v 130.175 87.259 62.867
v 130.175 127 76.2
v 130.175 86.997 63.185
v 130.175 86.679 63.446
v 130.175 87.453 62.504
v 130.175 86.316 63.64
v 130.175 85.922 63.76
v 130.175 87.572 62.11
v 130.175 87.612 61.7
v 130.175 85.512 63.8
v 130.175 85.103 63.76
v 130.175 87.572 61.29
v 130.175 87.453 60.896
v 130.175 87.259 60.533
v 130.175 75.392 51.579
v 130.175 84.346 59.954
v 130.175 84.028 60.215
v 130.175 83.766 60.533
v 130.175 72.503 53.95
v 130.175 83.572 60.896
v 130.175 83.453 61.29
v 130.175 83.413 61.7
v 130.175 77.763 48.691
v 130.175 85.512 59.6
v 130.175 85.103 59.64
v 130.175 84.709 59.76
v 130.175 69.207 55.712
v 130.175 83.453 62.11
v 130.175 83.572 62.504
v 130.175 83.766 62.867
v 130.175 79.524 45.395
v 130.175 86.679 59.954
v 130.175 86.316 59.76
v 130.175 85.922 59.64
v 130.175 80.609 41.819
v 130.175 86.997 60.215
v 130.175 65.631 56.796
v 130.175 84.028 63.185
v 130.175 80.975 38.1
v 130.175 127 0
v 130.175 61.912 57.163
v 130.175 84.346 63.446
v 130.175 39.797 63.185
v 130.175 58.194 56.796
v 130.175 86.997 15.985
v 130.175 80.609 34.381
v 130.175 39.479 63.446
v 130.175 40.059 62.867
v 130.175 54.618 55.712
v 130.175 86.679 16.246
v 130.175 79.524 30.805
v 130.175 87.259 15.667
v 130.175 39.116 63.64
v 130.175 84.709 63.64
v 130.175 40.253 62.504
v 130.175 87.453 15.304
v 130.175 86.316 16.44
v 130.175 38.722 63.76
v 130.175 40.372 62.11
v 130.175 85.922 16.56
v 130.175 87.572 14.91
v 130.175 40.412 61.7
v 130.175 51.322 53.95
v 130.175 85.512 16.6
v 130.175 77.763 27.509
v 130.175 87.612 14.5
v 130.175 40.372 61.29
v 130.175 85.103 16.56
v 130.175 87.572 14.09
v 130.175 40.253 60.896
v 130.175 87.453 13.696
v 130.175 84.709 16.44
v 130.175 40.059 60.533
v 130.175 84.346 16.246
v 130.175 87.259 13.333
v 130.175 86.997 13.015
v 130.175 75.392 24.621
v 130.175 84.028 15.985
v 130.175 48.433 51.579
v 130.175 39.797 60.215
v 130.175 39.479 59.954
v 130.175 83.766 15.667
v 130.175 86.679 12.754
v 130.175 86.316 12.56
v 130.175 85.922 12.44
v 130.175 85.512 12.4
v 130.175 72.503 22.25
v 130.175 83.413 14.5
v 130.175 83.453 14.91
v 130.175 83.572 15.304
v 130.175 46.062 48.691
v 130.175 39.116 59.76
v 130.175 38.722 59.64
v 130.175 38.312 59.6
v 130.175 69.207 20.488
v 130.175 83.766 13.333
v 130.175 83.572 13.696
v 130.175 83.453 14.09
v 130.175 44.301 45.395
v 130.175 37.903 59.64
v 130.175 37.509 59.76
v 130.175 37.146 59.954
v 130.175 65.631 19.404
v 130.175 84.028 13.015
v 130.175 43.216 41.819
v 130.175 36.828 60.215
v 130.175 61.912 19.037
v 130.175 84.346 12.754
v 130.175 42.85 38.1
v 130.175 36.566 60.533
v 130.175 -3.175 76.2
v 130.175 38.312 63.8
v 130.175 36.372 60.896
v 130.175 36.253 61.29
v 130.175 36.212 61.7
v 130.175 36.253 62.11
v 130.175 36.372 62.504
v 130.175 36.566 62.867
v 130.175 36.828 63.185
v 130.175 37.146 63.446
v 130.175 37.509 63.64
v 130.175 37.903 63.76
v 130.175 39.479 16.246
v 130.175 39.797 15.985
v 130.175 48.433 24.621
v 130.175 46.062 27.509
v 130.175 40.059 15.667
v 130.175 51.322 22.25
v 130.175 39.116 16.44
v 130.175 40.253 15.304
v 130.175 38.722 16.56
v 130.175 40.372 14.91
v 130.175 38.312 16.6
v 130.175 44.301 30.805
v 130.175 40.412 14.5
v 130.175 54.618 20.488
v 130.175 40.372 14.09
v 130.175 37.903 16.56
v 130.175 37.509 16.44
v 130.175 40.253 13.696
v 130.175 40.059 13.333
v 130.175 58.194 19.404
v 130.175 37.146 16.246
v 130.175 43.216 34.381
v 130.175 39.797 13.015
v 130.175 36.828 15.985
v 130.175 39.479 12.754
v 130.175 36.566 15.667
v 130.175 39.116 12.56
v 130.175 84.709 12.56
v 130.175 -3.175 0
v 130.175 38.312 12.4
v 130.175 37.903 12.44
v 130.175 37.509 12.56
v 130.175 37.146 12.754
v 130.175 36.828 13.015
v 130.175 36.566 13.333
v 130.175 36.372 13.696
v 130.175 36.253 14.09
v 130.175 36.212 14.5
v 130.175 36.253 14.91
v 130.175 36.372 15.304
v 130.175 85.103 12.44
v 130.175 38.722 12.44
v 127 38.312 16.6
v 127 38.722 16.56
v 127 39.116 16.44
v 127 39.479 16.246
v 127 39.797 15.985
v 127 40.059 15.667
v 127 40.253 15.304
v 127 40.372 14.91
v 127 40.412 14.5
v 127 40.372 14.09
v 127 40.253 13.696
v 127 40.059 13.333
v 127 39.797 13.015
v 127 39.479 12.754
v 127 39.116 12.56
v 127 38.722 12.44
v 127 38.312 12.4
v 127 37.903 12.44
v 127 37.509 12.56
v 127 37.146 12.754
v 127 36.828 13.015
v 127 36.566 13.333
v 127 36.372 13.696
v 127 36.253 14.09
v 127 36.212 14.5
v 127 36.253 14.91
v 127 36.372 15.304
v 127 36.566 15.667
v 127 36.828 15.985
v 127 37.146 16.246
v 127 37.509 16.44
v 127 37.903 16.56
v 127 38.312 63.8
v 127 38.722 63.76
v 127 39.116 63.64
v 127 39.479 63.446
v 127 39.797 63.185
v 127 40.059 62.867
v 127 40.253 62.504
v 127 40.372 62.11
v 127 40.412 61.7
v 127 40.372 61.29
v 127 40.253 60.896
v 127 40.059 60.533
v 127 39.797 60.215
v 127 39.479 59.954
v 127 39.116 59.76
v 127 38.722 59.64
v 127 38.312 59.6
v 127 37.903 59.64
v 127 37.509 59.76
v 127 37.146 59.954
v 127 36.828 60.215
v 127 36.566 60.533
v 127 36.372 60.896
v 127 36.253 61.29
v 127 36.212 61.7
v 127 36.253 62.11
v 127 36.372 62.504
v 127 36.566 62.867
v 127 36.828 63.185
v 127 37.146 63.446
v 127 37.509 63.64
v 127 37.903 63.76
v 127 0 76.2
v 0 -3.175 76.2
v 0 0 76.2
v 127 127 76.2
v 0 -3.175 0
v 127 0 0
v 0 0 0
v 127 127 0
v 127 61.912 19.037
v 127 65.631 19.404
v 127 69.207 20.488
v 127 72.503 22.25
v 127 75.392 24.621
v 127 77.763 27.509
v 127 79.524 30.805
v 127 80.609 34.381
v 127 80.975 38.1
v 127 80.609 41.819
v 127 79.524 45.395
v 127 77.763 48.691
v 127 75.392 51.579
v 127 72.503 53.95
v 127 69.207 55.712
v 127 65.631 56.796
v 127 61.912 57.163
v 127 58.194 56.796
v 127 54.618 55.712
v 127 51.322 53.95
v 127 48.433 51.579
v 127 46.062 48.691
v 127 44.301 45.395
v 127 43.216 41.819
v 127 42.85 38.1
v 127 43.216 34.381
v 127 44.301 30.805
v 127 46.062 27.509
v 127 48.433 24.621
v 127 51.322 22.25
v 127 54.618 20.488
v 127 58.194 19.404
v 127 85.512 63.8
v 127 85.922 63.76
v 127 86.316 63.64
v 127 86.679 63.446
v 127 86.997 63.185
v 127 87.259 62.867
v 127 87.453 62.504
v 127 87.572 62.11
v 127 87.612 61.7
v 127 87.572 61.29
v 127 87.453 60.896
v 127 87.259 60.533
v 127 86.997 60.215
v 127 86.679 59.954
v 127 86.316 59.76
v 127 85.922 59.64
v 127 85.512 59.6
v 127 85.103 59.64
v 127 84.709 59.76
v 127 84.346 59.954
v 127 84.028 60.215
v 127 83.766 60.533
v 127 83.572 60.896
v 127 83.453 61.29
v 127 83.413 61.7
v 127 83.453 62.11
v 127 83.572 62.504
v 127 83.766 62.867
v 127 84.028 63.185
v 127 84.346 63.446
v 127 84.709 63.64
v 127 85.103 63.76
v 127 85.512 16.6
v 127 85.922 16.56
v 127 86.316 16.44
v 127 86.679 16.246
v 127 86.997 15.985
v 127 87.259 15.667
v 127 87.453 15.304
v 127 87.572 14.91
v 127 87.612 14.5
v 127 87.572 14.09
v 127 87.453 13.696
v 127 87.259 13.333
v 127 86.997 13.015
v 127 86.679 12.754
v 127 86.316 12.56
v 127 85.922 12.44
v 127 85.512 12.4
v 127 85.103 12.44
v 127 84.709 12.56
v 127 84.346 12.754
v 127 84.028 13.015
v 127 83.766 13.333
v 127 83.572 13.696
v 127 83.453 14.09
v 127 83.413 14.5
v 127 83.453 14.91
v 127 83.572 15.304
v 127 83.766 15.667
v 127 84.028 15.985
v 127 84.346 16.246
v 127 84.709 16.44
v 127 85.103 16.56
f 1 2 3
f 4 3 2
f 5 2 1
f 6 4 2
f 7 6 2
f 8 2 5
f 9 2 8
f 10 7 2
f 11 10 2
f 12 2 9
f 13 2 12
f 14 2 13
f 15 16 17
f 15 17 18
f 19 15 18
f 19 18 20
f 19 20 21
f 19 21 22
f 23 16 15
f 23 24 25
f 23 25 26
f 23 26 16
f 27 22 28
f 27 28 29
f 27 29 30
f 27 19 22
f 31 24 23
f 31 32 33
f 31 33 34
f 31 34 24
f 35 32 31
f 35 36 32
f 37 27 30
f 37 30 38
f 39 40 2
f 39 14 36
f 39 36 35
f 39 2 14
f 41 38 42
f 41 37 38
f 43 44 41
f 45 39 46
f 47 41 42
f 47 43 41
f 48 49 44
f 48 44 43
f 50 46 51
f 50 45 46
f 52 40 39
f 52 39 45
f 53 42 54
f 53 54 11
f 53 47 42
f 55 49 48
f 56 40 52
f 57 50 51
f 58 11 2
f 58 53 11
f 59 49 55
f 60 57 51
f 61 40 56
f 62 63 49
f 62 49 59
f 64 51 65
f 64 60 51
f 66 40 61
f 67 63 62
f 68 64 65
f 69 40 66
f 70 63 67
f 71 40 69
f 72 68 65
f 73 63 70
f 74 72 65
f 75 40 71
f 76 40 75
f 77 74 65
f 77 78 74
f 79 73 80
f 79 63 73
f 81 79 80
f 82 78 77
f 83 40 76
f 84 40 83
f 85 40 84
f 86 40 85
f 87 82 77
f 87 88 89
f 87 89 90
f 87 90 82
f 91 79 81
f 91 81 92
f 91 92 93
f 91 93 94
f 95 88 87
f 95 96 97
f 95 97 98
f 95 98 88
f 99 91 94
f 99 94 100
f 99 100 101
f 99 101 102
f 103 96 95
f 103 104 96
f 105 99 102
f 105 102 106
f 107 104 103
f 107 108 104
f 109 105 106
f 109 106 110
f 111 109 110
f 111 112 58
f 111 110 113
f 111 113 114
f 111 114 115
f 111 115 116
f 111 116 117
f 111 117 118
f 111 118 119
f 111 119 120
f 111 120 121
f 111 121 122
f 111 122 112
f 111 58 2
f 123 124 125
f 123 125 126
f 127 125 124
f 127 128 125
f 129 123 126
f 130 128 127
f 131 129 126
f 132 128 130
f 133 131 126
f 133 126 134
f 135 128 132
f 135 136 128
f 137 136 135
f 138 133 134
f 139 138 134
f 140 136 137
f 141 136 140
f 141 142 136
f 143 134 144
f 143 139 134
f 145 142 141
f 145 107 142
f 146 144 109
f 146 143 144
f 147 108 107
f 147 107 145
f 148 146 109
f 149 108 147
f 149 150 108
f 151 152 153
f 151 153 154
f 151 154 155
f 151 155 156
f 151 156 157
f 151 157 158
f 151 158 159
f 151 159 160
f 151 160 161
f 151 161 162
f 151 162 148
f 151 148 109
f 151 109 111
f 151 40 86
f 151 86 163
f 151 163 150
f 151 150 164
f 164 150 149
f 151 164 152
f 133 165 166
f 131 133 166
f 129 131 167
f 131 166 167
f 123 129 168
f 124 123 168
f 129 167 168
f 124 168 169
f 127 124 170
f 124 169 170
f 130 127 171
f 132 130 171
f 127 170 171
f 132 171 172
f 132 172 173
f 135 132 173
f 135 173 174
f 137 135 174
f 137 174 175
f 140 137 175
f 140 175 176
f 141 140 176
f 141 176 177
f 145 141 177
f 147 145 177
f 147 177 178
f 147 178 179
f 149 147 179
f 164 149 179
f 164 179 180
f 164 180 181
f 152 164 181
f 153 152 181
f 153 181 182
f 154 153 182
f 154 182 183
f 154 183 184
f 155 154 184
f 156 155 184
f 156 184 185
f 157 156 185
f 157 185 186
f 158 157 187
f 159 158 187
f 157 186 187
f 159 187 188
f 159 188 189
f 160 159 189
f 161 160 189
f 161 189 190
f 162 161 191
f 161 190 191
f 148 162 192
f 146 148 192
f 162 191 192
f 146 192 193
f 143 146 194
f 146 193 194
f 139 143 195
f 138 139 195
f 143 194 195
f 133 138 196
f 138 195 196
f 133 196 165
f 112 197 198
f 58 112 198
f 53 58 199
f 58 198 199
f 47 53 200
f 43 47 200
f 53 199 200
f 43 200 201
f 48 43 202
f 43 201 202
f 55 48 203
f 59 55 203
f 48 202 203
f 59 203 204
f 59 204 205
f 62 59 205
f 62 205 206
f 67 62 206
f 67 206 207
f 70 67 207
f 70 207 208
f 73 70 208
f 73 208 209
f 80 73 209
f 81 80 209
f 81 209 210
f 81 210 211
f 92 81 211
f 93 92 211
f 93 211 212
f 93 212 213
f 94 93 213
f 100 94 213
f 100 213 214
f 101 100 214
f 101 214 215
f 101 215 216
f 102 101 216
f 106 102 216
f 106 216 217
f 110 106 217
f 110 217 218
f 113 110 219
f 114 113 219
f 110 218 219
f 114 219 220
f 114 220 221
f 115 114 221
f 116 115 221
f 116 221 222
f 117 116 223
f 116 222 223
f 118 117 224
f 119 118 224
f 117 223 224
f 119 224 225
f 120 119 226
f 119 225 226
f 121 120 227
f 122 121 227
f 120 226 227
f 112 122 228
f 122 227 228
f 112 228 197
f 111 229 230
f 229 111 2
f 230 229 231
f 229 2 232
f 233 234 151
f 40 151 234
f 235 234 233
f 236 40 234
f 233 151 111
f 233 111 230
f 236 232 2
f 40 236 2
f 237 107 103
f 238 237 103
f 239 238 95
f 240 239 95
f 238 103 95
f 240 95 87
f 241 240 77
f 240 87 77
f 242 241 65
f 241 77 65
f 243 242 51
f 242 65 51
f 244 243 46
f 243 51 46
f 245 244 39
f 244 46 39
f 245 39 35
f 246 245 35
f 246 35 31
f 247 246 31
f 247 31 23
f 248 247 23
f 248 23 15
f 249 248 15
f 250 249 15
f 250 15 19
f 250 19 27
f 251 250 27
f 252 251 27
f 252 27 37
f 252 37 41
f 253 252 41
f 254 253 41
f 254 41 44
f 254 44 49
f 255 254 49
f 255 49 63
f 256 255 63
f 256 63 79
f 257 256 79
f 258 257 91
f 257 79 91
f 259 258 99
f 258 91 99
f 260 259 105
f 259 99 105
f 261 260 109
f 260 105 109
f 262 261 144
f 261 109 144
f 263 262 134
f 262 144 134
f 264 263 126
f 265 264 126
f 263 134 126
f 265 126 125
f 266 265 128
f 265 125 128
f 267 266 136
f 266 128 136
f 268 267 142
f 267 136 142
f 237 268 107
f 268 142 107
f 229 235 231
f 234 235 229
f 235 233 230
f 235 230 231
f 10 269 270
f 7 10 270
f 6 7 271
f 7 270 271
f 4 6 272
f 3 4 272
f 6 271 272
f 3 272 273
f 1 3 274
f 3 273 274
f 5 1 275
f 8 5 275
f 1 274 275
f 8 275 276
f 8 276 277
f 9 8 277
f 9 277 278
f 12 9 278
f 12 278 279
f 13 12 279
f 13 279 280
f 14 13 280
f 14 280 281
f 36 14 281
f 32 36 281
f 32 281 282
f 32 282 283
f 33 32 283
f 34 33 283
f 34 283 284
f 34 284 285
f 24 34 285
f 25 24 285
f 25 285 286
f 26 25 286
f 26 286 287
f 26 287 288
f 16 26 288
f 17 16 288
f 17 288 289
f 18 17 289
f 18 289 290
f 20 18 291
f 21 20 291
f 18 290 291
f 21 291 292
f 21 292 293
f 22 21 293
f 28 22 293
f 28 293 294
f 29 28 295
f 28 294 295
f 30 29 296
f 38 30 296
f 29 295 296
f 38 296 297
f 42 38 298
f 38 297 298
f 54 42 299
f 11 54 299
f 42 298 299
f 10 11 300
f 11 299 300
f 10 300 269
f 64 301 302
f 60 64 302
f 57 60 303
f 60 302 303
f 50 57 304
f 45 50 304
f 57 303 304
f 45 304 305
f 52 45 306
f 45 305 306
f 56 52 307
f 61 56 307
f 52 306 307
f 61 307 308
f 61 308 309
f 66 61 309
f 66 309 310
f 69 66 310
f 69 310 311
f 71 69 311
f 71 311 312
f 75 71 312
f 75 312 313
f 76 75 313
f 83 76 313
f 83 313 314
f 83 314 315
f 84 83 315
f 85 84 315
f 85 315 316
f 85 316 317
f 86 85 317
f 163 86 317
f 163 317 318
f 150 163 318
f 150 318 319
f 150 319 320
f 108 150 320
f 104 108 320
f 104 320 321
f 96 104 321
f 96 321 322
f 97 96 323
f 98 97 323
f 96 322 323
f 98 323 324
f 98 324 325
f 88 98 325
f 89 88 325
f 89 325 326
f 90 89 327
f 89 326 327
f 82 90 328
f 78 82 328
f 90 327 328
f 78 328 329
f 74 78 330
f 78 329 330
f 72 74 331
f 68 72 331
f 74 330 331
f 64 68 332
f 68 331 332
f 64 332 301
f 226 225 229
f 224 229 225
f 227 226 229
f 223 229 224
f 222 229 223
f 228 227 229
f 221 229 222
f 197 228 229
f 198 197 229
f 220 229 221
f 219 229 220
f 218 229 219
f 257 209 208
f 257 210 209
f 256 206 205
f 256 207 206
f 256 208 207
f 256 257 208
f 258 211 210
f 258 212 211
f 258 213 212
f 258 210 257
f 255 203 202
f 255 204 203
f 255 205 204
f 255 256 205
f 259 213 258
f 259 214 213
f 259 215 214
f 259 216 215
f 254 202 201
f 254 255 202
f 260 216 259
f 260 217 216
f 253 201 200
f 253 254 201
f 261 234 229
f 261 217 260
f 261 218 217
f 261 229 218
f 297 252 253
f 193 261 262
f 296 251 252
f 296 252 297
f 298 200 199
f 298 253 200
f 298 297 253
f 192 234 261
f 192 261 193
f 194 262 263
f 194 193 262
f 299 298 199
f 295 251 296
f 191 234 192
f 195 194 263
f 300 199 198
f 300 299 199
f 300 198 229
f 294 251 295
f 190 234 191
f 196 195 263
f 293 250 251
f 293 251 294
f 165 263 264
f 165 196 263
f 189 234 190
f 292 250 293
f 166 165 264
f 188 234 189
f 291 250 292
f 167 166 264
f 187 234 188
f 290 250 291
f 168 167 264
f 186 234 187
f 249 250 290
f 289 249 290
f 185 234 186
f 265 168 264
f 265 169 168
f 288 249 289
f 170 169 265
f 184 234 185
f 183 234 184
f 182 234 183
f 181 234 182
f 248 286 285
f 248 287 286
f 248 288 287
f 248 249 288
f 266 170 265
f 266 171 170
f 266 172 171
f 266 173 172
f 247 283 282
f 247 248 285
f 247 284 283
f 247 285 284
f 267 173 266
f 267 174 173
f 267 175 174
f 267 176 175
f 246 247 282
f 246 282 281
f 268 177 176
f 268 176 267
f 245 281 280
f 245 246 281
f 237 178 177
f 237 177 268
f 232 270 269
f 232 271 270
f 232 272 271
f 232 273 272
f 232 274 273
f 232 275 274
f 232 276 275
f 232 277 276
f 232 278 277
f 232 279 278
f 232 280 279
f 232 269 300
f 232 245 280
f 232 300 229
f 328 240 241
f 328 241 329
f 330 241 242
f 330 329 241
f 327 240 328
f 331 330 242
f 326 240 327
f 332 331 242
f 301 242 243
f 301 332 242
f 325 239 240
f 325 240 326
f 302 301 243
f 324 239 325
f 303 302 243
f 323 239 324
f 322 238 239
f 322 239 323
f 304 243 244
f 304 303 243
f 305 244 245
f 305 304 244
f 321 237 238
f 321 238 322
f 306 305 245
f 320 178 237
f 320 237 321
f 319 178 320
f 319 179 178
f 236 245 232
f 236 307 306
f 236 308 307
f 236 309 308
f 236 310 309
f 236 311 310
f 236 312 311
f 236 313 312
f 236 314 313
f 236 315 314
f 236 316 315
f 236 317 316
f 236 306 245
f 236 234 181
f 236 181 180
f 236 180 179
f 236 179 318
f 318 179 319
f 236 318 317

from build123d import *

# Parameters (mm, degrees)
EXTRUDE_THIN1_DEPTH             = 76.2
TAP_DRILL_FOR_M5X0_8_TAP1_D     = 4.2
TAP_DRILL_FOR_M5X0_8_TAP1_DEPTH = 11.938
TAP_DRILL_FOR_M5X0_8_TAP1_TIP   = 1.2618073
SKETCH4_R                       = 19.0627
CUT_EXTRUDE1_DEPTH              = 198.182581951


with BuildPart() as part:
    # Sketch1 → Extrude-Thin1 (new body)
    with BuildSketch(Plane.XY):
        Polygon((0, 0), (127, 0), (127, 127), (130.175, 127), (130.175, -3.175), (0, -3.175), align=None)
    extrude(amount=EXTRUDE_THIN1_DEPTH)

    # Tap Drill for M5x0.8 Tap1
    with Locations(Plane(origin=(130.175, 0, 0), x_dir=(0, 0, -1), z_dir=(1, 0, 0))):
        with Locations((-14.5, 85.5125), (-61.7, 38.3125), (-61.7, 85.5125), (-14.5, 38.3125)):
            Hole(TAP_DRILL_FOR_M5X0_8_TAP1_D / 2, depth=TAP_DRILL_FOR_M5X0_8_TAP1_DEPTH)
            with Locations((0, 0, -(TAP_DRILL_FOR_M5X0_8_TAP1_DEPTH + TAP_DRILL_FOR_M5X0_8_TAP1_TIP / 2))):  # 118° drill point
                Cone(0, TAP_DRILL_FOR_M5X0_8_TAP1_D / 2, TAP_DRILL_FOR_M5X0_8_TAP1_TIP, mode=Mode.SUBTRACT)

    # Sketch4 → Cut-Extrude1 (cut, through all)
    with BuildSketch(Plane(origin=(130.175, 0, 0), x_dir=(0, 0, -1), z_dir=(1, 0, 0))):
        with Locations((-38.1, 61.9125)):
            Circle(SKETCH4_R)
    extrude(amount=-CUT_EXTRUDE1_DEPTH, mode=Mode.SUBTRACT)


solid = part.part
